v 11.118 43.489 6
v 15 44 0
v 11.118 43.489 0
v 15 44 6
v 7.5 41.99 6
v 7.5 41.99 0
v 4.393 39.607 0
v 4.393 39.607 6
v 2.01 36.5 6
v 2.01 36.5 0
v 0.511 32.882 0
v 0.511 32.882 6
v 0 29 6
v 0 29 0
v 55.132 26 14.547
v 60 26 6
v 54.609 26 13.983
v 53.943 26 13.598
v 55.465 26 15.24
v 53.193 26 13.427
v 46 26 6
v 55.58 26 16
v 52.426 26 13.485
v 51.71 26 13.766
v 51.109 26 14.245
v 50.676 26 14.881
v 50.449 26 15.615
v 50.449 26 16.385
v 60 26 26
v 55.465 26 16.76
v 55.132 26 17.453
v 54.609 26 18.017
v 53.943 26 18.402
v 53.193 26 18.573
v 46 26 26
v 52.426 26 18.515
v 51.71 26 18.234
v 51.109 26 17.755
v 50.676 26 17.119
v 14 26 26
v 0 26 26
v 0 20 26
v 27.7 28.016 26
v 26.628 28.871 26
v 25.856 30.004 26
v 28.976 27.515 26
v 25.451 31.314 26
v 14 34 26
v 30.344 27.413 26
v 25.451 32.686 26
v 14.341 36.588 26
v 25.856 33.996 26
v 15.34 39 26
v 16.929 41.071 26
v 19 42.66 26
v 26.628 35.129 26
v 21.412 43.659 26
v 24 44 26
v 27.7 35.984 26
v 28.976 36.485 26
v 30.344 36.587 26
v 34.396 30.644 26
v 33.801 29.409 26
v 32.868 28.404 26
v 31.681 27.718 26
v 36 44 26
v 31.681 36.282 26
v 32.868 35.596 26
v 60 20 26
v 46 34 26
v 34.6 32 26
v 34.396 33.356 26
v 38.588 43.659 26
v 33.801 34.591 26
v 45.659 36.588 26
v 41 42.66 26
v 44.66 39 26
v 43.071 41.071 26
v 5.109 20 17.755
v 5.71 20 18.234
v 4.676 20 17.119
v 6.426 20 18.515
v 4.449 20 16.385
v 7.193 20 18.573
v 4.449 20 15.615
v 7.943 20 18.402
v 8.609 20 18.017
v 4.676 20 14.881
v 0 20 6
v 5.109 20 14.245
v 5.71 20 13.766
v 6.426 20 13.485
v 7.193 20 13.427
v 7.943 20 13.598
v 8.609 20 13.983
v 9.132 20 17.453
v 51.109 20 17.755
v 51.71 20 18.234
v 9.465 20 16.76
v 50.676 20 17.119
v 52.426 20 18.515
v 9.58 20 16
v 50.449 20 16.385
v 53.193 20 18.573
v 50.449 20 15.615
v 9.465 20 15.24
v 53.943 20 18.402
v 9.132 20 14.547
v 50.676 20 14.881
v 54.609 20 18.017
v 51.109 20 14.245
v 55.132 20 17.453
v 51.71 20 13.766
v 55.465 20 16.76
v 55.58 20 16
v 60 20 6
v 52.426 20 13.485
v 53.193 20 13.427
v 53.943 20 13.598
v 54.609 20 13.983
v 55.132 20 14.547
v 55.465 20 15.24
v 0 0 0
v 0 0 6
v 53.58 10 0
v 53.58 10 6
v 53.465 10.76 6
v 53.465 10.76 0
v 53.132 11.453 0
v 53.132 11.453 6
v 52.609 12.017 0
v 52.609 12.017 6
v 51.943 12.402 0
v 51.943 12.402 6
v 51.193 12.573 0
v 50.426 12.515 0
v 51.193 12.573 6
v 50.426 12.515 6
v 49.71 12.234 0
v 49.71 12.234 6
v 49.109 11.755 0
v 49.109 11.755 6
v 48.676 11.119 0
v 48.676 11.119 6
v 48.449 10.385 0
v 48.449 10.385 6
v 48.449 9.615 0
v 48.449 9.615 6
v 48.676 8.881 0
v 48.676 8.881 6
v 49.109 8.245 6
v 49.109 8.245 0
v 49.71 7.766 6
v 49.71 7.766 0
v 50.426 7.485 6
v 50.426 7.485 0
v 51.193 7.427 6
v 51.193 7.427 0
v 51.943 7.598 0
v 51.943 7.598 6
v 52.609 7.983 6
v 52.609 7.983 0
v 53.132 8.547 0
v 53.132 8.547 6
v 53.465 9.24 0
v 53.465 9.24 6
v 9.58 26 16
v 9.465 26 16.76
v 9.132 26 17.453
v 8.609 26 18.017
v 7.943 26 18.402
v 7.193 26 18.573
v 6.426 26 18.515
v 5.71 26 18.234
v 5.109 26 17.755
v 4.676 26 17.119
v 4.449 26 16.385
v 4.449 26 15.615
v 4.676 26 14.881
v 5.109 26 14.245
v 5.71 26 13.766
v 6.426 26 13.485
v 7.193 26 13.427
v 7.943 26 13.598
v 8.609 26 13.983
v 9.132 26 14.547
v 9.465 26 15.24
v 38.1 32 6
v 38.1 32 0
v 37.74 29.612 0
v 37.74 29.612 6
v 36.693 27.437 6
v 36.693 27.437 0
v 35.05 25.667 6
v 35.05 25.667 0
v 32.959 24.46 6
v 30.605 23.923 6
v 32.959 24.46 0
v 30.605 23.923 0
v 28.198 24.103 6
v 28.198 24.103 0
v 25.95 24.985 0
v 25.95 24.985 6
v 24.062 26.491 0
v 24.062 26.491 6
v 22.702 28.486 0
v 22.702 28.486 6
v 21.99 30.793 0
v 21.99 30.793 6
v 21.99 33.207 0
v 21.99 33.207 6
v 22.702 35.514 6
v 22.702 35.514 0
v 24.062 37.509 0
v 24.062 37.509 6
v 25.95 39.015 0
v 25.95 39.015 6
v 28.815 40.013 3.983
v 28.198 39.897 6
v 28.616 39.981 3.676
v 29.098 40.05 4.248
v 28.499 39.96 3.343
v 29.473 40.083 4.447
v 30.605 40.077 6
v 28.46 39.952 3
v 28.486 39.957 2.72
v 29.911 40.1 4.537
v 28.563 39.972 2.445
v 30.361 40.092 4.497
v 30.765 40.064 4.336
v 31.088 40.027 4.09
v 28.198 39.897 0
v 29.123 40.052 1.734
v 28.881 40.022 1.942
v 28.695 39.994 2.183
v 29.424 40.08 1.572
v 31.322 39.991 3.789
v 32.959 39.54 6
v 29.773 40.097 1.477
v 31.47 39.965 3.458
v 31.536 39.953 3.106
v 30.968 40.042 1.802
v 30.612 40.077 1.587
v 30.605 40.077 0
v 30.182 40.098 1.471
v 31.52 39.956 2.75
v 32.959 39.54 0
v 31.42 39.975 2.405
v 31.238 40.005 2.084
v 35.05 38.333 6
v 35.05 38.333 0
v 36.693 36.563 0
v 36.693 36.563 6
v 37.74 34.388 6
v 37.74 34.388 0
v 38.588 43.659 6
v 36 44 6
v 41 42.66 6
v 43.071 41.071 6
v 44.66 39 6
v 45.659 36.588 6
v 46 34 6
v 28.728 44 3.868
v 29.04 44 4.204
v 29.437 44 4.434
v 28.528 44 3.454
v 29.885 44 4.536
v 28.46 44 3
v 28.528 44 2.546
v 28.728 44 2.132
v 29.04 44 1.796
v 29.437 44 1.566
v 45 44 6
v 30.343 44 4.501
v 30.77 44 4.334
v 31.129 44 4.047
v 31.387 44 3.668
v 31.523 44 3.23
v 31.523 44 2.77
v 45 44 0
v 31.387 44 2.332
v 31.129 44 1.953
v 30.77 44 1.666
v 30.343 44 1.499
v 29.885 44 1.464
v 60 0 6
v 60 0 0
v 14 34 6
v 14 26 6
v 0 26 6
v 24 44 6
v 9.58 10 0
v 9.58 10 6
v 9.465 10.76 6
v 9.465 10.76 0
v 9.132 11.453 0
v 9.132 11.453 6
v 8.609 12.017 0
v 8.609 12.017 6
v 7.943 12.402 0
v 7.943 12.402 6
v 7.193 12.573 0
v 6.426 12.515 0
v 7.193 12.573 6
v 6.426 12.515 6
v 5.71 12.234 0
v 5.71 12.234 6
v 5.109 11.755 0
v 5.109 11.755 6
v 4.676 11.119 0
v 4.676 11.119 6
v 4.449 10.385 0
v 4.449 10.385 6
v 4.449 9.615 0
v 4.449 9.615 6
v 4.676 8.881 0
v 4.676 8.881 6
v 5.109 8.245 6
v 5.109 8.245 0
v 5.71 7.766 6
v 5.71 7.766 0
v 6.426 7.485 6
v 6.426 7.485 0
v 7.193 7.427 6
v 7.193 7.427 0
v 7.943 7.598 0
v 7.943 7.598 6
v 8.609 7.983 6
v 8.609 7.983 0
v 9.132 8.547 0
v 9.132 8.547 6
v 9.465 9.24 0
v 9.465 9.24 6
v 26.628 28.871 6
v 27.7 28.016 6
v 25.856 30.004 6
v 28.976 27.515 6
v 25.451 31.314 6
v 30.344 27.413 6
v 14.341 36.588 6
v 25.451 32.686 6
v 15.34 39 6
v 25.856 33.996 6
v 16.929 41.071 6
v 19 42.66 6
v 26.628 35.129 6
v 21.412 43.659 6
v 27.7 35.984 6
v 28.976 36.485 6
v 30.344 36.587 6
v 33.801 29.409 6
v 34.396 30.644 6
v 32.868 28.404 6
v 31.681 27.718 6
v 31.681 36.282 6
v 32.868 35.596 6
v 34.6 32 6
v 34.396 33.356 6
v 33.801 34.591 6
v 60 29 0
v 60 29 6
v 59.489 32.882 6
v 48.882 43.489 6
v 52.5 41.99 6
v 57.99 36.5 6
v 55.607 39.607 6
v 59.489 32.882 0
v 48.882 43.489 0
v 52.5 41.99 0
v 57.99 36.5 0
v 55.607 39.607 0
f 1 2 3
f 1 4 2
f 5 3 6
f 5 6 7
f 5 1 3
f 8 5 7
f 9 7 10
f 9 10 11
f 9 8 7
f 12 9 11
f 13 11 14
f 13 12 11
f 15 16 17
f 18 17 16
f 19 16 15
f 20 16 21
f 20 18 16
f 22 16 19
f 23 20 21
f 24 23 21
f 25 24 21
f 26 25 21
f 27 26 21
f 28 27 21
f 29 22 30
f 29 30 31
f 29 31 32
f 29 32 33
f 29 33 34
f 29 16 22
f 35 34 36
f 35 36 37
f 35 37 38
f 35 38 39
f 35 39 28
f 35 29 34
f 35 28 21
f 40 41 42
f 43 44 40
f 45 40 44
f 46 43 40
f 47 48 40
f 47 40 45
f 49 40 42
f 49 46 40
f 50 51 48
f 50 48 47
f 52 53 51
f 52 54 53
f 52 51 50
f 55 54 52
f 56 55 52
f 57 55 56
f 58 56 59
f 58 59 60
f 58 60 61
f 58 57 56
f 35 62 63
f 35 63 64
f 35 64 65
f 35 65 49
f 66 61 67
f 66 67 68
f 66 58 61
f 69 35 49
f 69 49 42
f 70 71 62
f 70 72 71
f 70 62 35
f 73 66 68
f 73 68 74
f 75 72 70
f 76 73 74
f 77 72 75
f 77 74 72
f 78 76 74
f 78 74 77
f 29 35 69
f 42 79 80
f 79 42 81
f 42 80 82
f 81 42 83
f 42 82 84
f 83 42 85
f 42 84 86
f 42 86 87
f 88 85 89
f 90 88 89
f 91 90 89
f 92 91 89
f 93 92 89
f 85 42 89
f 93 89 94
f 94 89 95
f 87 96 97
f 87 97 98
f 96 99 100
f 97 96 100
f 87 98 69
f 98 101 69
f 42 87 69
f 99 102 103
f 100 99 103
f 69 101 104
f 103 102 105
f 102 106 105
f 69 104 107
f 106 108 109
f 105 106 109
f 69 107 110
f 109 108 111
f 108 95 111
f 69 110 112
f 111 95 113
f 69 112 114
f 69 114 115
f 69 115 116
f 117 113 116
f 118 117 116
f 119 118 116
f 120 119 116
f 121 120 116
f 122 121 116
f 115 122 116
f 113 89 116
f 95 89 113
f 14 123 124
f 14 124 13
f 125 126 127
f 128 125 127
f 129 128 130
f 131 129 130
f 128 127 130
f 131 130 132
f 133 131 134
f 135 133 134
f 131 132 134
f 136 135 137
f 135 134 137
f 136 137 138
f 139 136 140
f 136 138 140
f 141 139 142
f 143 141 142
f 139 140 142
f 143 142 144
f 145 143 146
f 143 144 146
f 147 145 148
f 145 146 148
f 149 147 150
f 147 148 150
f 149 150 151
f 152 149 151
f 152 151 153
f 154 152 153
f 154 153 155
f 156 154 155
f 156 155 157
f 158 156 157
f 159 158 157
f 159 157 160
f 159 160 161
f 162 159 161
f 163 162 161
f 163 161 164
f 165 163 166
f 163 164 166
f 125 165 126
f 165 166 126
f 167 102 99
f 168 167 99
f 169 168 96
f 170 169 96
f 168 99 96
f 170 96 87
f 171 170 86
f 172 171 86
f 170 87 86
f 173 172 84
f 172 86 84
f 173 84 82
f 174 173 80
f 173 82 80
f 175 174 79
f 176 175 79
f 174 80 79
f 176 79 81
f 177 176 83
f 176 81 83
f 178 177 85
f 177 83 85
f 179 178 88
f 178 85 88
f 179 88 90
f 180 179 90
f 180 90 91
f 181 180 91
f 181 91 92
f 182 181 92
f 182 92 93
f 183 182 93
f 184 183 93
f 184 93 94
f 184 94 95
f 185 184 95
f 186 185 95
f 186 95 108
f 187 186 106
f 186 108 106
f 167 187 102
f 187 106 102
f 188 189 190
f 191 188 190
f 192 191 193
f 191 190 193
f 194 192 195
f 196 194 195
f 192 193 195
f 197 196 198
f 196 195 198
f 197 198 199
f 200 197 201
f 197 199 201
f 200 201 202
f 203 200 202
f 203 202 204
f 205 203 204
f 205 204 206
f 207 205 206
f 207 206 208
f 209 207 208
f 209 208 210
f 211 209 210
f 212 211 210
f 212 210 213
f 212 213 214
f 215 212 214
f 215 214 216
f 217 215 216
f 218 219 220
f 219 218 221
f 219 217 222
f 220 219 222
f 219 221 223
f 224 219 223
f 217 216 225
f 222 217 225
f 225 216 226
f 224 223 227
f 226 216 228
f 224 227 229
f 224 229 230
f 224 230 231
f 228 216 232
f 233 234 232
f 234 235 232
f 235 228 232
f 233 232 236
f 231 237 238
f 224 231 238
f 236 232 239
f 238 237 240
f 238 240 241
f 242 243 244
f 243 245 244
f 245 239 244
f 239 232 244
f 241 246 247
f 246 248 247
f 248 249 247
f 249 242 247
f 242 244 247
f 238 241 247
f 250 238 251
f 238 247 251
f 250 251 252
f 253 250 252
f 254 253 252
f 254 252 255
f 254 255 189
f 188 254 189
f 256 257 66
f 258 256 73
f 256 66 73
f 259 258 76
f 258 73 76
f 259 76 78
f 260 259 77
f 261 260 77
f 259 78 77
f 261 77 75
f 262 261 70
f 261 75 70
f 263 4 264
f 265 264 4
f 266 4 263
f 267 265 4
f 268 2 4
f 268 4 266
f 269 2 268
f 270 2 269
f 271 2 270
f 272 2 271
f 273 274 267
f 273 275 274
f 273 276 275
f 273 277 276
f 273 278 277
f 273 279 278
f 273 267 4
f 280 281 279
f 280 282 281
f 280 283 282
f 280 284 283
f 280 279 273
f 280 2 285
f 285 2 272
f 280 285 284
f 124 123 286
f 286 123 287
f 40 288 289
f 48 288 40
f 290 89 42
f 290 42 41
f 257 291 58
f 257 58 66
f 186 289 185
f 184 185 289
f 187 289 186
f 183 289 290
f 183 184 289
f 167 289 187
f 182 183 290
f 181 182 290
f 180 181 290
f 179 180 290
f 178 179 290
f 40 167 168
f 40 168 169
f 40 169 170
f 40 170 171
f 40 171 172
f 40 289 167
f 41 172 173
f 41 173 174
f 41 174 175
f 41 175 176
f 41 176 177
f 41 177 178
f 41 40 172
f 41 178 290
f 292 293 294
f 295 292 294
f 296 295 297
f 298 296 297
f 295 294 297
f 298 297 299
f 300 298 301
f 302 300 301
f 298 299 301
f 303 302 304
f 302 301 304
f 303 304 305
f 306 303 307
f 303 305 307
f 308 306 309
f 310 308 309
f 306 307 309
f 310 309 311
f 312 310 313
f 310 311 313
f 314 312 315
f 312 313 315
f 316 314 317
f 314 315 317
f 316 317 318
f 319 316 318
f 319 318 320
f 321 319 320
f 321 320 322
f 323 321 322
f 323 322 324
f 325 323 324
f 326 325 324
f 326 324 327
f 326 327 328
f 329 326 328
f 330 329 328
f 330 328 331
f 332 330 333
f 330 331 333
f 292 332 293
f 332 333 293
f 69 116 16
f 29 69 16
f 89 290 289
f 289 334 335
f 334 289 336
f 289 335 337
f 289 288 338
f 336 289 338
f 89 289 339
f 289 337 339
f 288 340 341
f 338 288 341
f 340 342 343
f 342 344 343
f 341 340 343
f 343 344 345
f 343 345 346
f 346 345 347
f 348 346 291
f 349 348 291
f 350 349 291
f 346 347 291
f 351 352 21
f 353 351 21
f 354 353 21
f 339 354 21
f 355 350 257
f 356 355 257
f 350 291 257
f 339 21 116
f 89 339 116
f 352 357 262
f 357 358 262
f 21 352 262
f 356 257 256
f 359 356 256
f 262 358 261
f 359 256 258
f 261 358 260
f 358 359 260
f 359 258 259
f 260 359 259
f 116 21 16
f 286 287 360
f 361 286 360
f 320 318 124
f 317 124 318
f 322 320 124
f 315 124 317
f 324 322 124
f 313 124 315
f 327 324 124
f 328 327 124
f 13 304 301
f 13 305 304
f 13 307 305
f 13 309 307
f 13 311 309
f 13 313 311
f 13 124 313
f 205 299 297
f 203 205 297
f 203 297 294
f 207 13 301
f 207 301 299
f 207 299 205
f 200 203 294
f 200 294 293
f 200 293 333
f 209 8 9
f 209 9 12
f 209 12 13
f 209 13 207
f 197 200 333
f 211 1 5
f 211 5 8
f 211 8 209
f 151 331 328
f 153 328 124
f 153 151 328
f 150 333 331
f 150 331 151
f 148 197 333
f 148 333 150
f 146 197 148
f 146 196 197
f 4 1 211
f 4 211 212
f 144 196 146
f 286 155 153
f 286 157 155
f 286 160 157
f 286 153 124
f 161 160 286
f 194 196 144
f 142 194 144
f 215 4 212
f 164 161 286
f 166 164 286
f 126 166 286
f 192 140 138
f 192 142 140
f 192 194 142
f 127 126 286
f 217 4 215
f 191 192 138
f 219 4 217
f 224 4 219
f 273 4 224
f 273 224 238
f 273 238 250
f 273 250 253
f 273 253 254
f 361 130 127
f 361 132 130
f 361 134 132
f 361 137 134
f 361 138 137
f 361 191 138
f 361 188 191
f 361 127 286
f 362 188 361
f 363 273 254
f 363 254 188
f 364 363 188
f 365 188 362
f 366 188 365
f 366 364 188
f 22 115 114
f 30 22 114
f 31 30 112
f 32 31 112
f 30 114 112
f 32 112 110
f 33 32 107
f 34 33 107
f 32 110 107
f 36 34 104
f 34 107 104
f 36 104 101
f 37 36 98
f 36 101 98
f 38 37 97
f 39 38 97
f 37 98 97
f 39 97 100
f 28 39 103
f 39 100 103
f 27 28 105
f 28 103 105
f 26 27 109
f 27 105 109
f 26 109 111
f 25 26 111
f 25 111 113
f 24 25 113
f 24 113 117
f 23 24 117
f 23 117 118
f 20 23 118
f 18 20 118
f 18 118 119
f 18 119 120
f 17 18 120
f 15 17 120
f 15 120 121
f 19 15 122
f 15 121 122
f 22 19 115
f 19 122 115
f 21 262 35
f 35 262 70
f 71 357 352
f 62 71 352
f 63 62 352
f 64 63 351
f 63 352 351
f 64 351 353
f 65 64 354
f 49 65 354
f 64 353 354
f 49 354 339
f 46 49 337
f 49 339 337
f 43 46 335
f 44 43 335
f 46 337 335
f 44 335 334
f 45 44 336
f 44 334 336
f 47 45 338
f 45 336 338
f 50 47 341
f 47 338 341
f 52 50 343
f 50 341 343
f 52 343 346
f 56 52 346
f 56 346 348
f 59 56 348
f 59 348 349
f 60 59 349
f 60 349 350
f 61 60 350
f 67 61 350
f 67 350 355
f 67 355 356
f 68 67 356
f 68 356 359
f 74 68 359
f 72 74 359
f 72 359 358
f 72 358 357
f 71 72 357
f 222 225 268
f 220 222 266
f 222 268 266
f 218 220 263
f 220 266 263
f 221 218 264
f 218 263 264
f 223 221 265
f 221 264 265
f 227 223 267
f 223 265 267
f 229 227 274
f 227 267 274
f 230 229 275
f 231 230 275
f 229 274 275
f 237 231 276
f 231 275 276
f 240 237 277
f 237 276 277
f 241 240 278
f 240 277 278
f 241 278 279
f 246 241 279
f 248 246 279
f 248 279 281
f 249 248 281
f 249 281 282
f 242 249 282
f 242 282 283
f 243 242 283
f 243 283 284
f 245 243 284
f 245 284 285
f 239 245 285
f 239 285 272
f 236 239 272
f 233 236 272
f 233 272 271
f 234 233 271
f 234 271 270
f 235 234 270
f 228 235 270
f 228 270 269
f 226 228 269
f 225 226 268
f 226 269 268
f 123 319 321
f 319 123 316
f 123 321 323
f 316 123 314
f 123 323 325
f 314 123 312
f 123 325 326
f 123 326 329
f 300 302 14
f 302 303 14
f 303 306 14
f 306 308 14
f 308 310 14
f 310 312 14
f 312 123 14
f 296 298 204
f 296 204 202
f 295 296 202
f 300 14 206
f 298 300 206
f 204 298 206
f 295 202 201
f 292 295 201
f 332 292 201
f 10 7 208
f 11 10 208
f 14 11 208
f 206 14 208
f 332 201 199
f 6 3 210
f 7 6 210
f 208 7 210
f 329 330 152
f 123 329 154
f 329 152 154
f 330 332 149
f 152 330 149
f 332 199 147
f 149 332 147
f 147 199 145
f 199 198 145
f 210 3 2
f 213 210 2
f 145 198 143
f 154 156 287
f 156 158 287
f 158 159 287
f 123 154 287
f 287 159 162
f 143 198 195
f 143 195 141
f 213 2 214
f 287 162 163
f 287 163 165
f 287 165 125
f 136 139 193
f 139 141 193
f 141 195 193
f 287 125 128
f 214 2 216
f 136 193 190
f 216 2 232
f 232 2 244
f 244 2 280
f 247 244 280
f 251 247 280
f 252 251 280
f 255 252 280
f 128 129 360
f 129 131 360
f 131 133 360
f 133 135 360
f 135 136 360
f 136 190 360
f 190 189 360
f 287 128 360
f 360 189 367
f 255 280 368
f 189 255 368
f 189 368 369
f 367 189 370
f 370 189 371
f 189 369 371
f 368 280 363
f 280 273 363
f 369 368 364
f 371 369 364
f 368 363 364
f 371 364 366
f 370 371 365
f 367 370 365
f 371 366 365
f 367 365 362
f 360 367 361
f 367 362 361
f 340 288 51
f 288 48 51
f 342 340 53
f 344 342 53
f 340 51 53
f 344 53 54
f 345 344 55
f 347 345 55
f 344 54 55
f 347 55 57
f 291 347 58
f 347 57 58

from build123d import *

# Parameters (mm, degrees)
BOX001_W        = 60
BOX001_H        = 24
BOX001_DEPTH    = 20
SKETCH_R        = 4.6
POCKET_DEPTH    = 20.001
SKETCH002_W     = 14
SKETCH002_H     = 20
POCKET002_DEPTH = 18
SKETCH003_R     = 2.58
POCKET003_DEPTH = 6
FILLET_R        = 10
FILLET001_R     = 10
BOX_W           = 60
BOX_H           = 44
BOX_DEPTH       = 6
SKETCH001_R     = 8.1
POCKET001_DEPTH = 9
SKETCH004_R     = 2.58
POCKET004_DEPTH = 6
SKETCH005_R     = 1.54
POCKET005_DEPTH = 5
FILLET002_R     = 15
FILLET003_R     = 15


with BuildPart() as fillet001:
    # Box001 → Box001 (new body)
    with BuildSketch(Plane(origin=(0, 20, 6), x_dir=(1, 0, 0), z_dir=(0, 0, 1))):
        with Locations((30, 12)):
            Rectangle(BOX001_W, BOX001_H)
    extrude(amount=BOX001_DEPTH)

    # Sketch → Pocket (cut, through all)
    with BuildSketch(Plane(origin=(0, 20, 6), x_dir=(1, 0, 0), z_dir=(0, 0, -1))):
        with Locations((30, -12)):
            Circle(SKETCH_R)
    extrude(amount=-POCKET_DEPTH, mode=Mode.SUBTRACT)

    # Sketch002 → Pocket002 (cut)
    with BuildSketch(Plane(origin=(0, 44, 6), x_dir=(-1, 0, 0), z_dir=(0, 1, 0))):
        with Locations((-53, 10)):
            Rectangle(SKETCH002_W, SKETCH002_H)
        with Locations((-7, 10)):
            Rectangle(SKETCH002_W, SKETCH002_H)
    extrude(amount=-POCKET002_DEPTH, mode=Mode.SUBTRACT)

    # Sketch003 → Pocket003 (cut)
    with BuildSketch(Plane(origin=(0, 20, 6), x_dir=(1, 0, 0), z_dir=(0, -1, 0))):
        with Locations((7, 10)):
            Circle(SKETCH003_R)
        with Locations((53, 10)):
            Circle(SKETCH003_R)
    extrude(amount=-POCKET003_DEPTH, mode=Mode.SUBTRACT)

    # Fillet
    fillet_edges = [fillet001.edges().sort_by_distance(p)[0] for p in [
        (14, 44, 16),
    ]]
    fillet(fillet_edges, radius=FILLET_R)

    # Fillet001
    fillet001_edges = [fillet001.edges().sort_by_distance(p)[0] for p in [
        (46, 44, 16),
    ]]
    fillet(fillet001_edges, radius=FILLET001_R)


with BuildPart() as fillet003:
    # Box → Box (new body)
    with BuildSketch(Plane.XY):
        with Locations((30, 22)):
            Rectangle(BOX_W, BOX_H)
    extrude(amount=BOX_DEPTH)

    # Sketch001 → Pocket001 (cut)
    with BuildSketch(Plane(origin=(0, 0, 0), x_dir=(1, 0, 0), z_dir=(0, 0, -1))):
        with Locations((30, -32)):
            Circle(SKETCH001_R)
    extrude(amount=-POCKET001_DEPTH, mode=Mode.SUBTRACT)

    # Sketch004 → Pocket004 (cut)
    with BuildSketch(Plane.XY.offset(6)):
        with Locations((7, 10)):
            Circle(SKETCH004_R)
        with Locations((51, 10)):
            Circle(SKETCH004_R)
    extrude(amount=-POCKET004_DEPTH, mode=Mode.SUBTRACT)

    # Sketch005 → Pocket005 (cut)
    with BuildSketch(Plane(origin=(0, 44, 0), x_dir=(-1, 0, 0), z_dir=(0, 1, 0))):
        with Locations((-30, 3)):
            Circle(SKETCH005_R)
    extrude(amount=-POCKET005_DEPTH, mode=Mode.SUBTRACT)

    # Fillet002
    fillet002_edges = [fillet003.edges().sort_by_distance(p)[0] for p in [
        (60, 44, 3),
    ]]
    fillet(fillet002_edges, radius=FILLET002_R)

    # Fillet003
    fillet003_edges = [fillet003.edges().sort_by_distance(p)[0] for p in [
        (0, 44, 3),
    ]]
    fillet(fillet003_edges, radius=FILLET003_R)


solid = Compound([fillet001.part, fillet003.part])
